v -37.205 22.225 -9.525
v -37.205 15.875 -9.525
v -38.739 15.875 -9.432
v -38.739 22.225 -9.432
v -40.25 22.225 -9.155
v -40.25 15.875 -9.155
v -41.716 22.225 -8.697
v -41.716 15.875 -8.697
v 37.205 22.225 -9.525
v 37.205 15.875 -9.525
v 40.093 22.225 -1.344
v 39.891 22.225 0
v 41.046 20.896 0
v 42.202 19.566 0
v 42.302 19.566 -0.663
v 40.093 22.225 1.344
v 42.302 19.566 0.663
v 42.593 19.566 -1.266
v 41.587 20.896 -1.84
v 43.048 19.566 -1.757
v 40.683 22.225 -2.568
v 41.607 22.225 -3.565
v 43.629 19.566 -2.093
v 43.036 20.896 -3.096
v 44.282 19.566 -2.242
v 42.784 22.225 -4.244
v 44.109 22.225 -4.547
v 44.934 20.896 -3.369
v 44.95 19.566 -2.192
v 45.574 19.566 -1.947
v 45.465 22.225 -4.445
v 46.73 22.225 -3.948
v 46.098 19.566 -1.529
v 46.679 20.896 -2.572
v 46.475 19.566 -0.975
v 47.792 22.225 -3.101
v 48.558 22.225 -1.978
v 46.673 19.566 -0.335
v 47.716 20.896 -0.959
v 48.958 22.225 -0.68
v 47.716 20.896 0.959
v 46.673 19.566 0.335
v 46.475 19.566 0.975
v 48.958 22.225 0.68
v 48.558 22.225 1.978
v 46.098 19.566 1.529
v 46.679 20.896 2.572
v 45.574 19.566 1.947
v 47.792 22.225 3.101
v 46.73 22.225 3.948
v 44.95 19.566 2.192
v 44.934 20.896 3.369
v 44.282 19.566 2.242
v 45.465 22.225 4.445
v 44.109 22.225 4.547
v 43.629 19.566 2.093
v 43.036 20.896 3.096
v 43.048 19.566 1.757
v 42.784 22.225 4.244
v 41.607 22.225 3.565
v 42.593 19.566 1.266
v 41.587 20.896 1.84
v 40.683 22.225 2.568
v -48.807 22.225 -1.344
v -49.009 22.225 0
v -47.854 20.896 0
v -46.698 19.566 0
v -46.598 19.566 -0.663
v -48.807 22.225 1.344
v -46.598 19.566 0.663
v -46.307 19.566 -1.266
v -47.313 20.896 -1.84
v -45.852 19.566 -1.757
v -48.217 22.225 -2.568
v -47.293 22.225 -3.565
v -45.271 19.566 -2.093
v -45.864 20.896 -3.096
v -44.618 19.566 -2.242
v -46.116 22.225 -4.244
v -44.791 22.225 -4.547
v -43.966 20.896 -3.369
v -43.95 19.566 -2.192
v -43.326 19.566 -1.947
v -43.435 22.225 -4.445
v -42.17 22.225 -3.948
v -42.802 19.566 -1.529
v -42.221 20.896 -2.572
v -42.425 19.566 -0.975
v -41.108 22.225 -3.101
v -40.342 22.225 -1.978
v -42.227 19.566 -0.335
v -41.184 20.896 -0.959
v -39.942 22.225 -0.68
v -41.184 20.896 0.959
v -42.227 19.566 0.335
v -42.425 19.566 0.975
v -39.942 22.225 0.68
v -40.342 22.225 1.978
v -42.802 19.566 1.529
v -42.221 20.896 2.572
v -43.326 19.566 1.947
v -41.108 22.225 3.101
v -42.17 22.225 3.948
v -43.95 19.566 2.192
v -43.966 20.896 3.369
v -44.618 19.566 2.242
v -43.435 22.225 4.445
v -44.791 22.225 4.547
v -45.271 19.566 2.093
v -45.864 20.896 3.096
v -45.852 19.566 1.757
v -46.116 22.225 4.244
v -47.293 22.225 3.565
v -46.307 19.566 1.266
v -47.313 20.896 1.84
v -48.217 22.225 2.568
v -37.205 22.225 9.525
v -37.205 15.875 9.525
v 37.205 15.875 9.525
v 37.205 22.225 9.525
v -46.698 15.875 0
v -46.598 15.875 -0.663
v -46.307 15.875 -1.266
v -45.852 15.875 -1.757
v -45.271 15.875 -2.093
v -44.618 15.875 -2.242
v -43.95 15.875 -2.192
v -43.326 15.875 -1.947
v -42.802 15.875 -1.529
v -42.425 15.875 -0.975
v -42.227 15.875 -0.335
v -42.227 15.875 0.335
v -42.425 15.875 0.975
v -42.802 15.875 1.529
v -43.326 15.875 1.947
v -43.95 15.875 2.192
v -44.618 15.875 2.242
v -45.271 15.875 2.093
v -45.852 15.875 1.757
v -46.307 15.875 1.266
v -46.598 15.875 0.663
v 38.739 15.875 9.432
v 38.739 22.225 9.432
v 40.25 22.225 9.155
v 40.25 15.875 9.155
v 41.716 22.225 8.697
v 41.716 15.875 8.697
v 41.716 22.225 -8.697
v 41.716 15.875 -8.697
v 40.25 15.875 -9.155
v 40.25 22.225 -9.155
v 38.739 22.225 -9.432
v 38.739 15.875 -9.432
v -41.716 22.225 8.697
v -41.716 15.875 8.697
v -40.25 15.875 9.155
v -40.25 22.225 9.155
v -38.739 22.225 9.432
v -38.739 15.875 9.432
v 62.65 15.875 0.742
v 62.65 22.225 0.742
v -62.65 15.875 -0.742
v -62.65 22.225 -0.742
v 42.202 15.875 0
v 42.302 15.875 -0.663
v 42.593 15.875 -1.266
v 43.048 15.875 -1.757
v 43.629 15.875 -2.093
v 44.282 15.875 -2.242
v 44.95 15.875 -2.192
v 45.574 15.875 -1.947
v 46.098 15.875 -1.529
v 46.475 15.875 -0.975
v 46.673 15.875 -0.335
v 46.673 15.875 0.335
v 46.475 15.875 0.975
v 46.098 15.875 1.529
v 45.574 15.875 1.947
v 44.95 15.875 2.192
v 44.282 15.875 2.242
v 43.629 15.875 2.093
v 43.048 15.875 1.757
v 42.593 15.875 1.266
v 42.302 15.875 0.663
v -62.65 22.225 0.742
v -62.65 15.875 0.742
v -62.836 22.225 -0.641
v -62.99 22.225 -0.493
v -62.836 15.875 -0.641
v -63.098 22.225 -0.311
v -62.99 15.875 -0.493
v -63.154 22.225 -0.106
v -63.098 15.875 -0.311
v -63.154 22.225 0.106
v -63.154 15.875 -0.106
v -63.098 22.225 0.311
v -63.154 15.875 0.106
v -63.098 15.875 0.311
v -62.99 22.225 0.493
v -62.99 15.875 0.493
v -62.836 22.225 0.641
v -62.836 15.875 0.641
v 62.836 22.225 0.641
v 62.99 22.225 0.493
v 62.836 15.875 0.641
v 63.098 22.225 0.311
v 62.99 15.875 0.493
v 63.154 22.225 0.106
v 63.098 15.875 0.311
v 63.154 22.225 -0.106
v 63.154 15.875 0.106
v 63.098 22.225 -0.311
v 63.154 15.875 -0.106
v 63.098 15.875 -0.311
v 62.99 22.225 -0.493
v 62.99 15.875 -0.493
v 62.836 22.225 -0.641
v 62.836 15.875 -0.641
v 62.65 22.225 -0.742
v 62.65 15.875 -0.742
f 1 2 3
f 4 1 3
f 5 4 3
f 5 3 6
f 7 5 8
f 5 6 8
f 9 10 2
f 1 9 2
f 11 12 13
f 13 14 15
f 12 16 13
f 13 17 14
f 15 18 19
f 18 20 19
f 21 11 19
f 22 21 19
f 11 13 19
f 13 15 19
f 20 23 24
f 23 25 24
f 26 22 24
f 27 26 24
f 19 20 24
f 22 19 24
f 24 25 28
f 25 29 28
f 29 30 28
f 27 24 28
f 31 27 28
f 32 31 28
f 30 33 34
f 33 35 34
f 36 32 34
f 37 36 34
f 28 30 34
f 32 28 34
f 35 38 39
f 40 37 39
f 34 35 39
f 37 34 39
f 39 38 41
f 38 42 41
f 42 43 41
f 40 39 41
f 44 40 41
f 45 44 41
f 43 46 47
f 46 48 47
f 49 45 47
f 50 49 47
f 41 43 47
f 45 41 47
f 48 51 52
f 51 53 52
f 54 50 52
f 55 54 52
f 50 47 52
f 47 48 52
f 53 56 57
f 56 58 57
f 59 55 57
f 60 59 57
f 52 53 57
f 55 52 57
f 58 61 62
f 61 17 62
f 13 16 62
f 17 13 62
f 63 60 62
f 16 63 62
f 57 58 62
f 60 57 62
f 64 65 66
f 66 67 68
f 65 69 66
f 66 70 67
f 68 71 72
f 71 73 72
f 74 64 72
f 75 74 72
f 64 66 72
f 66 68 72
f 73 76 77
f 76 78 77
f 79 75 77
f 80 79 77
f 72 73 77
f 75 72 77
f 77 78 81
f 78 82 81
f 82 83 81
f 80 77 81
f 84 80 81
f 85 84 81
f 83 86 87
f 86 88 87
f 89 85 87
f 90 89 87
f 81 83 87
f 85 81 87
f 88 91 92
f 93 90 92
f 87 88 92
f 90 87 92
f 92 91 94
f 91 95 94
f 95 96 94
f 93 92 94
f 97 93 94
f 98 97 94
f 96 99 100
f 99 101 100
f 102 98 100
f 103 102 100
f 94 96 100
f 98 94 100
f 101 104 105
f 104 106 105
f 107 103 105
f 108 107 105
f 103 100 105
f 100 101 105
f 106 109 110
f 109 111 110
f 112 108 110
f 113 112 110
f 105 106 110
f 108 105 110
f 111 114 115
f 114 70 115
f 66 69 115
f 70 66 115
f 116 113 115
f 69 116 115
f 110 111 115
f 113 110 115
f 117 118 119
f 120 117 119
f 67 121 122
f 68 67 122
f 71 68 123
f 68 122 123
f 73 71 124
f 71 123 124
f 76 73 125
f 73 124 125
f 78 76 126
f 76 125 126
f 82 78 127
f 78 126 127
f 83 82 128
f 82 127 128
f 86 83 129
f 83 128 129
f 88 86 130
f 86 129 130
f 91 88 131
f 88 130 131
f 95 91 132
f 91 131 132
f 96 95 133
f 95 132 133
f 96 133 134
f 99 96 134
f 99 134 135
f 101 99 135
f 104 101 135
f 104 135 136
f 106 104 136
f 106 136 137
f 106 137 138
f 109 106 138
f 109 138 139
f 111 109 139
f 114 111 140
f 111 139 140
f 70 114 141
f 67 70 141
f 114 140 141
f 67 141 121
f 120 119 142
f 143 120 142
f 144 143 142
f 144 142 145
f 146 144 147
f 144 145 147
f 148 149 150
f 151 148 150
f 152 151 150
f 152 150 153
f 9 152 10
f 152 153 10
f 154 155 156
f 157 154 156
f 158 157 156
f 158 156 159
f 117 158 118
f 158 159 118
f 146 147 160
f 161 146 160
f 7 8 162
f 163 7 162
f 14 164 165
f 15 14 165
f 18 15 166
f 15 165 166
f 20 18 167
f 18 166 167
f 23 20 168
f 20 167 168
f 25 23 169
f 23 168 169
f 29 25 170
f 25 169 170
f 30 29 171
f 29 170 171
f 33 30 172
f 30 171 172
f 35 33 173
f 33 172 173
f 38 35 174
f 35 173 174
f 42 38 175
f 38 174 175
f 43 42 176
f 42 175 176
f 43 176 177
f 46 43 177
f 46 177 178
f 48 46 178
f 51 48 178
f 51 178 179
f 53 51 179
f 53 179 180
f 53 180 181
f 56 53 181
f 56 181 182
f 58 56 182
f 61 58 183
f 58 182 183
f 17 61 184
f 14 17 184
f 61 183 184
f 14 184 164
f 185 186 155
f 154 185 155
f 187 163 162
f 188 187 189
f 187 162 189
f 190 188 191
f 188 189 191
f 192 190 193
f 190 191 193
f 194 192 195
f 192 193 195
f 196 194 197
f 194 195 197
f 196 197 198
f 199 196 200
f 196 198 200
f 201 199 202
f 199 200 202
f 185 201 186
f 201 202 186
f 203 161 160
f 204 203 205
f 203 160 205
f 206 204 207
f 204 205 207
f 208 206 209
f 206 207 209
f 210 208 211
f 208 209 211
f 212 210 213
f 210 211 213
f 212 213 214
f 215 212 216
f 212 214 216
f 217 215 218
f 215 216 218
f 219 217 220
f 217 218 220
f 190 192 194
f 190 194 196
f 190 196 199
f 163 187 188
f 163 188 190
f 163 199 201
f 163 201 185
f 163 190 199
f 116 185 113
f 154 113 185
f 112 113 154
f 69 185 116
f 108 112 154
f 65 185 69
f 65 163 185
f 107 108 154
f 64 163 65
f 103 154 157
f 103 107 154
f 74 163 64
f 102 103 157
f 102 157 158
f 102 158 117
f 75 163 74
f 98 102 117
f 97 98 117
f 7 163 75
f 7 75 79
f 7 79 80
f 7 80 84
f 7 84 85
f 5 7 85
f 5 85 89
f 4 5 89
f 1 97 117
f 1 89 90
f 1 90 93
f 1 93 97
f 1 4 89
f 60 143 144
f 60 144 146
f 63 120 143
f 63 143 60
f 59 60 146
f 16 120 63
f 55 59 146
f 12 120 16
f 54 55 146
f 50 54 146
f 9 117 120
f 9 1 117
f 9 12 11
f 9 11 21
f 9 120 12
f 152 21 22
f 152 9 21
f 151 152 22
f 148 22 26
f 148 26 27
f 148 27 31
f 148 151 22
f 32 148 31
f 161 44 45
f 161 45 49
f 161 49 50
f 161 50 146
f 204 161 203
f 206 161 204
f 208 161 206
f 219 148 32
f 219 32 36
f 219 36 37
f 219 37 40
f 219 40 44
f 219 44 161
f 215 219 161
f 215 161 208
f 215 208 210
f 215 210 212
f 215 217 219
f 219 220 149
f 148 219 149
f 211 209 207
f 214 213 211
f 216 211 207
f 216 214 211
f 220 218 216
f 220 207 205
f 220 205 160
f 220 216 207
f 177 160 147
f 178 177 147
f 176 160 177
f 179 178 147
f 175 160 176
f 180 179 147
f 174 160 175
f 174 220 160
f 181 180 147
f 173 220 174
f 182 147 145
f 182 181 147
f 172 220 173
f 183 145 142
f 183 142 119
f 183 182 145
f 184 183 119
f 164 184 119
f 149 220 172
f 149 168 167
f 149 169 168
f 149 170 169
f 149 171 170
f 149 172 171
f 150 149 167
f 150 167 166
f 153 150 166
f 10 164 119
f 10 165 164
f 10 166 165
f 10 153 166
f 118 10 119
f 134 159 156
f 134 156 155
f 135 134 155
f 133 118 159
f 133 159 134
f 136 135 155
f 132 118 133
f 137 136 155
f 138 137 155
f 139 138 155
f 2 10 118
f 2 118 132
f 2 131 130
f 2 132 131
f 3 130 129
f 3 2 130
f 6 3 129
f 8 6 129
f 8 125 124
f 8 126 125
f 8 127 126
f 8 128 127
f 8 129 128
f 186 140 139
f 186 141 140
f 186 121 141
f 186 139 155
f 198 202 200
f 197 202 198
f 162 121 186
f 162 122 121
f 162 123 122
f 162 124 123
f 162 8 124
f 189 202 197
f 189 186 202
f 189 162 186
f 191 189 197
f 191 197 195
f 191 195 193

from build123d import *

# Parameters (mm, degrees)
BOSS_EXTRUDE2_DEPTH                               = 22.225
BOSS_EXTRUDE2_DEPTH_BACK                          = 10
SKETCH2_W                                         = 153.14353988
SKETCH2_H                                         = 6.35
CUT_EXTRUDE1_DEPTH                                = 4.7625
SKETCH3_W                                         = 152.758434582
SKETCH3_H                                         = 6.35
CUT_EXTRUDE2_DEPTH                                = 4.7625
FILLET3_R                                         = 12.7
FILLET4_R                                         = 12.7
FILLET5_R                                         = 12.7
FILLET6_R                                         = 12.7
CUT_EXTRUDE3_DEPTH                                = 94.675
CUT_EXTRUDE3_DEPTH_BACK                           = 84.675
SKETCH12_R                                        = 168.402
CSK_FOR_8_FLAT_HEAD_SOCKET_CAP_SCREW2_D           = 4.4958
CSK_FOR_8_FLAT_HEAD_SOCKET_CAP_SCREW2_CSINK_D     = 9.1186
CSK_FOR_8_FLAT_HEAD_SOCKET_CAP_SCREW2_CSINK_ANGLE = 82
SKETCH24_W                                        = 181.235061551
SKETCH24_H                                        = 69.255288946
CUT_EXTRUDE5_DEPTH                                = 84.675


with BuildPart() as part:
    # Sketch1 → Boss-Extrude2 (new, two sides: drawn at the far end of the back side and taken through both)
    with BuildSketch(Plane(origin=(0, 0, 0), x_dir=(1, 0, 0), z_dir=(0, 1, 0)).offset(-BOSS_EXTRUDE2_DEPTH_BACK)):
        with BuildLine():
            Line((37.204956004, 9.525), (-37.204956004, 9.525))
            ThreePointArc((-37.204956004, 9.525), (-39.498289417, 9.316221792), (-41.716221563, 8.696751473))
            Line((-41.716221563, 8.696751473), (-62.649818949, 0.741984467))
            ThreePointArc((-62.649818949, 0.741984467), (-63.161614851, 0), (-62.649818949, -0.741984467))
            Line((-62.649818949, -0.741984467), (-41.716221563, -8.696751473))
            ThreePointArc((-41.716221563, -8.696751473), (-39.498289417, -9.316221792), (-37.204956004, -9.525))
            Line((-37.204956004, -9.525), (37.204956004, -9.525))
            ThreePointArc((37.204956004, -9.525), (39.498289417, -9.316221792), (41.716221563, -8.696751473))
            Line((41.716221563, -8.696751473), (62.649818949, -0.741984467))
            ThreePointArc((62.649818949, -0.741984467), (63.161614851, 0), (62.649818949, 0.741984467))
            Line((62.649818949, 0.741984467), (41.716221563, 8.696751473))
            ThreePointArc((41.716221563, 8.696751473), (39.498289417, 9.316221792), (37.204956004, 9.525))
        make_face()
    extrude(amount=BOSS_EXTRUDE2_DEPTH + BOSS_EXTRUDE2_DEPTH_BACK)

    # Sketch2 → Cut-Extrude1 (cut)
    with BuildSketch(Plane.XY.offset(9.525)):
        with Locations((7.894658594, 12.7)):
            Rectangle(SKETCH2_W, SKETCH2_H)
    extrude(amount=-CUT_EXTRUDE1_DEPTH, mode=Mode.SUBTRACT)

    # Sketch3 → Cut-Extrude2 (cut)
    with BuildSketch(Plane(origin=(0, 0, -9.525), x_dir=(-1, 0, 0), z_dir=(0, 0, -1))):
        with Locations((8.600684972, 12.7)):
            Rectangle(SKETCH3_W, SKETCH3_H)
    extrude(amount=-CUT_EXTRUDE2_DEPTH, mode=Mode.SUBTRACT)

    # Fillet3
    fillet3_edges = [part.edges().sort_by_distance(p)[0] for p in [
        (52.069514915, 12.7, -4.7625),
    ]]
    fillet(fillet3_edges, radius=FILLET3_R)

    # Fillet4
    fillet4_edges = [part.edges().sort_by_distance(p)[0] for p in [
        (52.069514915, 12.7, 4.7625),
    ]]
    fillet(fillet4_edges, radius=FILLET4_R)

    # Fillet5
    fillet5_edges = [part.edges().sort_by_distance(p)[0] for p in [
        (-52.069514915, 12.7, 4.7625),
    ]]
    fillet(fillet5_edges, radius=FILLET5_R)

    # Fillet6
    fillet6_edges = [part.edges().sort_by_distance(p)[0] for p in [
        (-52.069514915, 12.7, -4.7625),
    ]]
    fillet(fillet6_edges, radius=FILLET6_R)

    # Sketch12 → Cut-Extrude3 (cut, two sides: drawn at the far end of the back side and taken through both)
    with BuildSketch(Plane(origin=(0, 0, 0), x_dir=(0, 0, -1), z_dir=(1, 0, 0)).offset(-CUT_EXTRUDE3_DEPTH_BACK)):
        with Locations((0, -168.402)):
            Circle(SKETCH12_R)
    extrude(amount=CUT_EXTRUDE3_DEPTH + CUT_EXTRUDE3_DEPTH_BACK, mode=Mode.SUBTRACT)

    # CSK for #8 Flat Head Socket Cap Screw2 (through all)
    with Locations(Plane(origin=(0, 22.225, 0), x_dir=(1, 0, 0), z_dir=(0, 1, 0))):
        with Locations((-44.45, 0), (44.45, 0)):
            CounterSinkHole(CSK_FOR_8_FLAT_HEAD_SOCKET_CAP_SCREW2_D / 2, CSK_FOR_8_FLAT_HEAD_SOCKET_CAP_SCREW2_CSINK_D / 2, counter_sink_angle=CSK_FOR_8_FLAT_HEAD_SOCKET_CAP_SCREW2_CSINK_ANGLE)

    # Sketch24 → Cut-Extrude5 (cut)
    with BuildSketch(Plane(origin=(0, 15.875, 0), x_dir=(1, 0, 0), z_dir=(0, 1, 0))):
        with Locations((3.936847216, -3.169453317)):
            Rectangle(SKETCH24_W, SKETCH24_H)
    extrude(amount=-CUT_EXTRUDE5_DEPTH, mode=Mode.SUBTRACT)


solid = part.part
